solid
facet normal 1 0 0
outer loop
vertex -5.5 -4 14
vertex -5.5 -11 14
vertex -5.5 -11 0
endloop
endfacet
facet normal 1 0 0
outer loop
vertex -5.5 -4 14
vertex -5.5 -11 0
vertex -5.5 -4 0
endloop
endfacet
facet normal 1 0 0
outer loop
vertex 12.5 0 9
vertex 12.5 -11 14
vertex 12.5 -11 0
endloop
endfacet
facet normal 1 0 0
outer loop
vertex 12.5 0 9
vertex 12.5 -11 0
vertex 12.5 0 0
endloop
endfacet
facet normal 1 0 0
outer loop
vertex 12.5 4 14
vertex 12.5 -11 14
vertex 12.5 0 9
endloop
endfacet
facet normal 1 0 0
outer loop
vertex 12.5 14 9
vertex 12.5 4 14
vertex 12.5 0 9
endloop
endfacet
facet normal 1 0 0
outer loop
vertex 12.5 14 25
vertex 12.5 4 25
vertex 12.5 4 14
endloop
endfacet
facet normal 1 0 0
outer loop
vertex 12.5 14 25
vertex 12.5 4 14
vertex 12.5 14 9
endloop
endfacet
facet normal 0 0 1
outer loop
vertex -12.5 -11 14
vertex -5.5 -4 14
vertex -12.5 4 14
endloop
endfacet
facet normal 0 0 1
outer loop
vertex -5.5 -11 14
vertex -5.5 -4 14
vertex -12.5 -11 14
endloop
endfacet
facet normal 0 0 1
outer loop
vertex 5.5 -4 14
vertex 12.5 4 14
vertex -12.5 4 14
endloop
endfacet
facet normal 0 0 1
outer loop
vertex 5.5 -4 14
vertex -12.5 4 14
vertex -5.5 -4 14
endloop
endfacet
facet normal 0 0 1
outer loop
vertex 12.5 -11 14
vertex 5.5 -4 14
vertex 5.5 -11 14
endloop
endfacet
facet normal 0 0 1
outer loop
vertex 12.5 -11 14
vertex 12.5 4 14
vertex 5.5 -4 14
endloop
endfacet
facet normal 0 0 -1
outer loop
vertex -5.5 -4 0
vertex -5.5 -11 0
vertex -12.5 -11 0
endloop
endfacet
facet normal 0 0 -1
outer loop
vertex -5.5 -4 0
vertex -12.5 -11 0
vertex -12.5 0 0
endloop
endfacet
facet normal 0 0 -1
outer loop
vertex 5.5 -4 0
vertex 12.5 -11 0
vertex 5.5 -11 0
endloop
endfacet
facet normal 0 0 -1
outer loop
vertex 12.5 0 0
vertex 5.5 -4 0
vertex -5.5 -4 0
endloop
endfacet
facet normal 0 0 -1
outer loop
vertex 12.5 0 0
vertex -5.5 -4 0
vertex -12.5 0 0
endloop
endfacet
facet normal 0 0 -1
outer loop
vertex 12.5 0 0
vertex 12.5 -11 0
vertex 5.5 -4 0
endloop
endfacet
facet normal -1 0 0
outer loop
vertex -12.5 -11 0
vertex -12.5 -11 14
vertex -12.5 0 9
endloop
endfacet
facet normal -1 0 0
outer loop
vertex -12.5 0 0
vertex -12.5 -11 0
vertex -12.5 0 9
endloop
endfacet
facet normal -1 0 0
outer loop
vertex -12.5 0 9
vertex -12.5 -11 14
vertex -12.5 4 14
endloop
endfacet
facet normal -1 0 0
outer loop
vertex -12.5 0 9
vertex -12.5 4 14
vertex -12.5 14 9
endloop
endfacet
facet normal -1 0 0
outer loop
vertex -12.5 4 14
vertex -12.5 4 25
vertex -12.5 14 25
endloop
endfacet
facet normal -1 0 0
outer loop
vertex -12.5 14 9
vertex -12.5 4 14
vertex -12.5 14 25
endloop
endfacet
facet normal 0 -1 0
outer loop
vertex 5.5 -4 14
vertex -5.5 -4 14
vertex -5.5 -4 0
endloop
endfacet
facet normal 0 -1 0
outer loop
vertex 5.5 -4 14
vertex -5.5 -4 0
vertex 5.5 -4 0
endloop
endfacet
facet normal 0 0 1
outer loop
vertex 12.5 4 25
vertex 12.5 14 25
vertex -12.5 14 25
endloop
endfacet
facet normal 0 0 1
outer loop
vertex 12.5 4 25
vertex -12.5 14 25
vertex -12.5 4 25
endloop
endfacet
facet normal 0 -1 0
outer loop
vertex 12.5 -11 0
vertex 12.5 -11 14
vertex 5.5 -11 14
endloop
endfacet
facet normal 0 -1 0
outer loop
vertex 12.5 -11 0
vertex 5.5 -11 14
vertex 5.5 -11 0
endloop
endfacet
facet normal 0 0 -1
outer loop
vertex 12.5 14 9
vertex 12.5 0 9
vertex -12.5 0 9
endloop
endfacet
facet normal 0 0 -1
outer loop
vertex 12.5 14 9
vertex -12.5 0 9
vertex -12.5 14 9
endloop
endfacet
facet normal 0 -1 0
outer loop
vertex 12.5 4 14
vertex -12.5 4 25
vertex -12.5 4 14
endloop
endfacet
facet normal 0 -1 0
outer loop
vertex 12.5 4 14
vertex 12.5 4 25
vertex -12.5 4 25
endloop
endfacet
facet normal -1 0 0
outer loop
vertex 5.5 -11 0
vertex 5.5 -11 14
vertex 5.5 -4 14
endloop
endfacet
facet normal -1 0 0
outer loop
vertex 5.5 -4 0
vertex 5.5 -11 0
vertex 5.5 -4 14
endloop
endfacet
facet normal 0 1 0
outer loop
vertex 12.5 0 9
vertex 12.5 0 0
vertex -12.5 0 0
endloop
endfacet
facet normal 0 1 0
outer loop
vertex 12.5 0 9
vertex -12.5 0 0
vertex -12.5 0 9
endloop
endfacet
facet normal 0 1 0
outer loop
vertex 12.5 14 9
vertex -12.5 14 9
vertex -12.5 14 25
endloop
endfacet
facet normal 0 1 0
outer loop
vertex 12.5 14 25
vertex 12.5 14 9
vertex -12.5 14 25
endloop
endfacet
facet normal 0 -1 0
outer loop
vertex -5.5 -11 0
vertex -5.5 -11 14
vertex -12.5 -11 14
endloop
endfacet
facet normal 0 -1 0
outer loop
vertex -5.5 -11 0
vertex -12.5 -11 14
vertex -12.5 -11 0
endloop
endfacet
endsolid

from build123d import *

# Parameters (mm, degrees)
F1_DEPTH = 12.5
F2_W     = 11
F2_H     = 7
F3_DEPTH = 14.001


with BuildPart() as f1:
    # F0 (on Right) → F1 (new body, symmetric)
    with BuildSketch(Plane.YZ):
        Polygon((-11, 14), (-11, 0), (0, 0), (0, 9), (14, 9), (14, 25), (4, 25), (4, 14), align=None)
    extrude(amount=F1_DEPTH, both=True)

    # F2 (on face) → F3 (cut, through all)
    with BuildSketch(Plane.XY.offset(14)):
        with Locations((0, -7.5)):
            Rectangle(F2_W, F2_H)
    extrude(amount=-F3_DEPTH, mode=Mode.SUBTRACT)


solid = f1.part
